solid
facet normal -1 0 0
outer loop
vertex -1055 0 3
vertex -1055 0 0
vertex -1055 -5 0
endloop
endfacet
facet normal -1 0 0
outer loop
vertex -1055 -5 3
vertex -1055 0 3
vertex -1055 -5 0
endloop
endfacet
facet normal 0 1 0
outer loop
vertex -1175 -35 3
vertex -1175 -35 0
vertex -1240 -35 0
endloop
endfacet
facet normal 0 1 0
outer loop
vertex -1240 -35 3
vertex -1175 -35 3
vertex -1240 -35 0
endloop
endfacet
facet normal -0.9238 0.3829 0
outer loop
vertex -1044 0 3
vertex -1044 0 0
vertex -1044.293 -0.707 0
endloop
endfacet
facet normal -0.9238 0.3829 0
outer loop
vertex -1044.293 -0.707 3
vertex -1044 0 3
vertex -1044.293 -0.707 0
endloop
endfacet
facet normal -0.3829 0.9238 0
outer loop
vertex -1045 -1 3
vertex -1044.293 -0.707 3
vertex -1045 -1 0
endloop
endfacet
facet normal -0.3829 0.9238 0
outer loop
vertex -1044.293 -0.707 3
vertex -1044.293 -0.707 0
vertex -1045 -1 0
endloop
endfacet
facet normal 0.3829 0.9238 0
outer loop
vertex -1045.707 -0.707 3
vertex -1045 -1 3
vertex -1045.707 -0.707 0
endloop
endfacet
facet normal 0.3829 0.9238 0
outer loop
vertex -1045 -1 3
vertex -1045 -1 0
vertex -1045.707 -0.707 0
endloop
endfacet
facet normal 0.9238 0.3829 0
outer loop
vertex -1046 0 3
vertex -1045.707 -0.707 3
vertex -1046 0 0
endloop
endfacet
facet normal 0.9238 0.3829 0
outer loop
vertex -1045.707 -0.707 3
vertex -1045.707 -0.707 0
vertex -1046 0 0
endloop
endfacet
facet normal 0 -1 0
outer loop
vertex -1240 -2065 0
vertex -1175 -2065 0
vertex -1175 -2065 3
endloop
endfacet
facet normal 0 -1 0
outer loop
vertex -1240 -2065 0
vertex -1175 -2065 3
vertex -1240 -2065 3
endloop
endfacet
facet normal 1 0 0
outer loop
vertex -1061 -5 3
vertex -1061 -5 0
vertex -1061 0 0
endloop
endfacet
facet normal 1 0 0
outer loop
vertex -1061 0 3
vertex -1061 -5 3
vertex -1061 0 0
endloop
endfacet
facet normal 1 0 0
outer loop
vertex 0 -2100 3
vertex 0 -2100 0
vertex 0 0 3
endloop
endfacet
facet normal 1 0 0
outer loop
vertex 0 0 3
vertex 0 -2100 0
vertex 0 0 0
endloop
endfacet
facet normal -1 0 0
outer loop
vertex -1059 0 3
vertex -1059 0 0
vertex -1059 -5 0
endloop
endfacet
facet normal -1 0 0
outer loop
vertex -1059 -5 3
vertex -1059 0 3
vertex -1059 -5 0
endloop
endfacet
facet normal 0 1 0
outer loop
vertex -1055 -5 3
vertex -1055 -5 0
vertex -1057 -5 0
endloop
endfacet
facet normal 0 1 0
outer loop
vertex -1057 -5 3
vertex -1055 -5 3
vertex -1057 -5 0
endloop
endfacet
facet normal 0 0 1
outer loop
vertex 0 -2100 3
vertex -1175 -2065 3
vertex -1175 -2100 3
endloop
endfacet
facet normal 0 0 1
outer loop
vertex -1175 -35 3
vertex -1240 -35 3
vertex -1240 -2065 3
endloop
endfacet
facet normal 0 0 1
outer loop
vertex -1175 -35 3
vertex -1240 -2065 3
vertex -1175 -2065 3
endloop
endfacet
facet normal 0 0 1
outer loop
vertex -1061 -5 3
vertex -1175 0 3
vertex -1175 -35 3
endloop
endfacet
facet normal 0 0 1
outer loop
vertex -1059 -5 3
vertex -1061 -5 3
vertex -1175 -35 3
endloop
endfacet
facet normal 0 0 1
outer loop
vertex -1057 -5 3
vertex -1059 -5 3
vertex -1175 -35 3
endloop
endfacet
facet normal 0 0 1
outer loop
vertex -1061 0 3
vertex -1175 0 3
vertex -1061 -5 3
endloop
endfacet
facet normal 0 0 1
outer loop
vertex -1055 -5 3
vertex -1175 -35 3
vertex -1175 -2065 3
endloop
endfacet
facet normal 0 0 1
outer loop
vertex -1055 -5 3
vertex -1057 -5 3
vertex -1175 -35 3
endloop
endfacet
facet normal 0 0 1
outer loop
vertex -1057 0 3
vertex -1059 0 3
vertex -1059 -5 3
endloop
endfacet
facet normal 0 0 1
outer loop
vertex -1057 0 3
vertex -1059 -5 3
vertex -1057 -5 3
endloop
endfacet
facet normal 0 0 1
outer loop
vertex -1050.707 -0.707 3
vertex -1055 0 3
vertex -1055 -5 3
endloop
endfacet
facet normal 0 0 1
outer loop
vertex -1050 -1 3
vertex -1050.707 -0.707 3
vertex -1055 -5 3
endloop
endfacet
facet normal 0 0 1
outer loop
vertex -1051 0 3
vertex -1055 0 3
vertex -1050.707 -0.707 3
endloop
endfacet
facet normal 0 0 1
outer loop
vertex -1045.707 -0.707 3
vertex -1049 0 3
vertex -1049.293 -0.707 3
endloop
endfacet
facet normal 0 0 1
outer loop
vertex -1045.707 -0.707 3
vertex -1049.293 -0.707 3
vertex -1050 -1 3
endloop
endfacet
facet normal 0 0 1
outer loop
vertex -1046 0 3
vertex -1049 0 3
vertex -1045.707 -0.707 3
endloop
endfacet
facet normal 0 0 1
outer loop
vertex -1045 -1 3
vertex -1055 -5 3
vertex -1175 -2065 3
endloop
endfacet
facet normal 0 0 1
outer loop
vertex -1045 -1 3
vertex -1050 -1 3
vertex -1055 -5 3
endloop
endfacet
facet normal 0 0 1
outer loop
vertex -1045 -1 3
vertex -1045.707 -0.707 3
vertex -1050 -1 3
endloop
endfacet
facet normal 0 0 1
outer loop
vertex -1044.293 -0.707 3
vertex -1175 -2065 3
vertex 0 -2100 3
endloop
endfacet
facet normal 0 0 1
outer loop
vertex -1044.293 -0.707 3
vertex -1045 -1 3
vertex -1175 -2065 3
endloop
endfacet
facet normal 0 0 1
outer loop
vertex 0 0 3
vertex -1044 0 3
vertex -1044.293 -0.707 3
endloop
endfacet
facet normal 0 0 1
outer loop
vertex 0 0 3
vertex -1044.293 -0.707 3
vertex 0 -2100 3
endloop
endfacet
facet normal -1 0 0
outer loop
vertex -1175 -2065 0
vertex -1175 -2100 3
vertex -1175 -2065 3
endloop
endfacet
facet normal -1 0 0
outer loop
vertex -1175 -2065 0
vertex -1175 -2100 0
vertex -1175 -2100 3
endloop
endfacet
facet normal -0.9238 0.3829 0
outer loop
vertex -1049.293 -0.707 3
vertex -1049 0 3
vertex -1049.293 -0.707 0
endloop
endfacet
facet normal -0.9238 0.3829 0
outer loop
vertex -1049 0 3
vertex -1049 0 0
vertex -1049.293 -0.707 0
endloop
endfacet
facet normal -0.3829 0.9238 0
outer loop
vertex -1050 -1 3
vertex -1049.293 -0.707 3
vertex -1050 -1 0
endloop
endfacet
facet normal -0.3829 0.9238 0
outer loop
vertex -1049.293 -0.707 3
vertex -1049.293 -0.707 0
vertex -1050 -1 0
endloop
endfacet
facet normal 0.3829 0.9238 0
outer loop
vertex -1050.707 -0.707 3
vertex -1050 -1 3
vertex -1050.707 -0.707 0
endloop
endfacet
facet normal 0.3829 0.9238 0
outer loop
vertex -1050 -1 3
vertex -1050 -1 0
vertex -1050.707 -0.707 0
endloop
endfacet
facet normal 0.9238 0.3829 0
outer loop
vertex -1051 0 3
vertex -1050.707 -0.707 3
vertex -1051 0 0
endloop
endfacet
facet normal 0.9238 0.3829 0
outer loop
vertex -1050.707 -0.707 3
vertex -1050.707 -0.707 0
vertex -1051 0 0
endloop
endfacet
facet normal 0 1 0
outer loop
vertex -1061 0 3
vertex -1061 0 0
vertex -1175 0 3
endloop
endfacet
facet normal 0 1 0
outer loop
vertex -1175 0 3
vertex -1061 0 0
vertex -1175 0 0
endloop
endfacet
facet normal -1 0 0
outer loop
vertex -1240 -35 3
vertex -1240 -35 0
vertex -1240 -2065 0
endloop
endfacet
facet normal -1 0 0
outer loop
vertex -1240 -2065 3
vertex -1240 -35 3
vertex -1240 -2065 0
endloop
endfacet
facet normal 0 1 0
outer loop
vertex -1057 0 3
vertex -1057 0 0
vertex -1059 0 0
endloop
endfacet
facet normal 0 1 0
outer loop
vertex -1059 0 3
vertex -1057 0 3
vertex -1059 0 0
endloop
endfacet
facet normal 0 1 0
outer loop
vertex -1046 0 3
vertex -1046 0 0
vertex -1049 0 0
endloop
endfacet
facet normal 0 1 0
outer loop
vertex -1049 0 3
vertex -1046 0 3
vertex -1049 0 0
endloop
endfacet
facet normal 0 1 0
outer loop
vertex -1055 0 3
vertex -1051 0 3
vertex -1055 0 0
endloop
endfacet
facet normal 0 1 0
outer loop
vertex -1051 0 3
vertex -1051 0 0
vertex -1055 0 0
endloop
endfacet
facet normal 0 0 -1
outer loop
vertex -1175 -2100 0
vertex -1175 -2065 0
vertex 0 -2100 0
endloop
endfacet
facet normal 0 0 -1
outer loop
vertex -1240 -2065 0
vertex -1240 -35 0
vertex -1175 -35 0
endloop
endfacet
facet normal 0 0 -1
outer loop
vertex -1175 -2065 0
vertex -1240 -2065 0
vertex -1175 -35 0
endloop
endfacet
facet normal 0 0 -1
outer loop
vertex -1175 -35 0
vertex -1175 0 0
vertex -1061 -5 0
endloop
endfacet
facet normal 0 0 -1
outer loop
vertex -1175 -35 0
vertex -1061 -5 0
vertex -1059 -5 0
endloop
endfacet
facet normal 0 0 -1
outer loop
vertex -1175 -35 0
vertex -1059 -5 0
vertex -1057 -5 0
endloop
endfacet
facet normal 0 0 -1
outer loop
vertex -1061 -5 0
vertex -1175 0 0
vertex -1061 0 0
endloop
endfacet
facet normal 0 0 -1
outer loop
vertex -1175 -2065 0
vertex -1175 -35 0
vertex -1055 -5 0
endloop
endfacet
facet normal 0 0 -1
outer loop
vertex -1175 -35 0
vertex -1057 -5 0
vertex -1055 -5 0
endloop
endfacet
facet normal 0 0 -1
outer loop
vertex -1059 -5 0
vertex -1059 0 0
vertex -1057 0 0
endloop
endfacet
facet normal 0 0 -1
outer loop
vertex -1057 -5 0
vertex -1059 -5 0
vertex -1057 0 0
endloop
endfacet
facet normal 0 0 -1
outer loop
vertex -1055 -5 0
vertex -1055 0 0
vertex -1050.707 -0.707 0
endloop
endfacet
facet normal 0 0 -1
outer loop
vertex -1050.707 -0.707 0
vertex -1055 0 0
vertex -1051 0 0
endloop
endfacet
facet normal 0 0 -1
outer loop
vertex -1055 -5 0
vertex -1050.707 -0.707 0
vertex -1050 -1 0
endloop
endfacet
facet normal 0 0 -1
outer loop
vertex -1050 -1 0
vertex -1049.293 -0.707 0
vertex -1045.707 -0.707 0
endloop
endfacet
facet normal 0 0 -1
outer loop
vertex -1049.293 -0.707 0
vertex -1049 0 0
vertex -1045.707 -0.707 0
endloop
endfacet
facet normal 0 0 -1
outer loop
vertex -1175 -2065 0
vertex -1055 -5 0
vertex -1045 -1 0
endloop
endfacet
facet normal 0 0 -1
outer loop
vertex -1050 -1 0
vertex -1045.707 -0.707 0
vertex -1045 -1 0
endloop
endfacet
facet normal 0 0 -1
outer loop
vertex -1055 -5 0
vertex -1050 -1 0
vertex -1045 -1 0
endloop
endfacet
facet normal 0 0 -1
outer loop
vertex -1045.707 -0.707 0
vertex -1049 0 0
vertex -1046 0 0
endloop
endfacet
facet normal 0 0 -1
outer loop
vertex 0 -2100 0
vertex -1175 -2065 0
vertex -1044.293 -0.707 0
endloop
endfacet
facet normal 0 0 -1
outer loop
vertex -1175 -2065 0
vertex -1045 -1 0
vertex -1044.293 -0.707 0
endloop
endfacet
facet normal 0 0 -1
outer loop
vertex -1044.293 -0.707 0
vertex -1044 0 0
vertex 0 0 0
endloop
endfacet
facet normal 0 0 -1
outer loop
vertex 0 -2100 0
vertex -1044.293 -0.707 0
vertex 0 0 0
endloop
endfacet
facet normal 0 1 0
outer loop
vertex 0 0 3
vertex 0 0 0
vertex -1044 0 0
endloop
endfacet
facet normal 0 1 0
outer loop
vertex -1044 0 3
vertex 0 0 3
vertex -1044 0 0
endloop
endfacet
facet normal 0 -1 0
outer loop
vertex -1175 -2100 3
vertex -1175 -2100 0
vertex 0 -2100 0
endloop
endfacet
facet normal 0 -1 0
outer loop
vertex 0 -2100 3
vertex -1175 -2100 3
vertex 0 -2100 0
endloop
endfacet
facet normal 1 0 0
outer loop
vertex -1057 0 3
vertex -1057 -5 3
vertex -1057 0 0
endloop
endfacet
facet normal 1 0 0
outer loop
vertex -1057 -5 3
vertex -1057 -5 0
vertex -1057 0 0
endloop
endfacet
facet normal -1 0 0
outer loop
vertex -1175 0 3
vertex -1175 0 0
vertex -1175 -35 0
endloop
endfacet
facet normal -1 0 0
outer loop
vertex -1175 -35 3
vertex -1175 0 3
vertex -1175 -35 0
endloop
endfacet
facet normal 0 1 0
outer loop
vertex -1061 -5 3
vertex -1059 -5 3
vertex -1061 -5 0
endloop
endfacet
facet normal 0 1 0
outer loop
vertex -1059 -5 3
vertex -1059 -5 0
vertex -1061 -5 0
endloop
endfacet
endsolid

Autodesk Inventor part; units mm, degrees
ref_plane "YZ Plane" through (0, 0, 0) normal (1, 0, 0) x (0, 1, 0)
ref_plane "XZ Plane" through (0, 0, 0) normal (0, 1, 0) x (-1, 0, 0)
ref_plane "XY Plane" through (0, 0, 0) normal (0, 0, 1) x (1, 0, 0)
sketch "Sketch1" plane through (0, 0, 0) normal (0, 0, 1) x (1, 0, 0)
  line L0 (0, 0) -> (-1240, 0)
  line L1 (-1240, 0) -> (-1240, -2100)
  line L2 (-1240, -2100) -> (0, -2100)
  line L3 (0, -2100) -> (0, 0)
  line L4 (0, 0) -> (-65, 0)
  line L5 (-65, 0) -> (-65, -35)
  line L6 (-65, -35) -> (0, -35)
  line L7 (0, -35) -> (0, 0)
  line L8 (0, -2100) -> (-65, -2100)
  line L9 (-65, -2100) -> (-65, -2065)
  line L10 (-65, -2065) -> (0, -2065)
  line L11 (0, -2065) -> (0, -2100)
  line L12 (-1240, 0) -> (-1175, 0)
  line L13 (-1175, 0) -> (-1175, -35)
  line L14 (-1175, -35) -> (-1240, -35)
  line L15 (-1240, -35) -> (-1240, 0)
  line L16 (-1240, -2100) -> (-1175, -2100)
  line L17 (-1175, -2100) -> (-1175, -2065)
  line L18 (-1175, -2065) -> (-1240, -2065)
  line L19 (-1240, -2065) -> (-1240, -2100)
  line L20 (-1125, -2100) -> (-1035, -2100)
  line L21 (-1035, -2100) -> (-1035, -2065)
  line L22 (-1035, -2065) -> (-1125, -2065)
  line L23 (-1125, -2065) -> (-1125, -2100)
  line L24 (-1125, 0) -> (-1035, 0)
  line L25 (-1035, 0) -> (-1035, -35)
  line L26 (-1035, -35) -> (-1125, -35)
  line L27 (-1125, -35) -> (-1125, 0)
  point P0 (0, -35)
  point P1 (-65, 0)
  point P2 (-65, -2100)
  point P3 (0, -2065)
  point P4 (-1035, -2100)
  point P5 (-1035, 0)
  point P6 (-1175, 0)
  point P7 (-1175, -2100)
  dimension "d22" = 1240
  dimension "d23" = 2100
  dimension "d24" = 65
  dimension "d25" = 35
  dimension "d28" = 90
  dimension "d29" = 970
extrude "Plate1" add sketch "Sketch1" along normal blind 3 contours L3 L6 L5 L0 | L5 L6 L3 L10 L9 L2 L21 L22 L23 L17 L18 L1 L14 L13 L0 L27 L26 L25 | L25 L26 L27 L0 | L3 L2 L9 L10 | L2 L23 L22 L21
sketch "Sketch5" plane through (0, 0, 0) normal (0, 0, -1) x (-1, 0, 0)
  line L0 (1175, 0) -> (1075, 0) construction
  line L1 (1075, 0) -> (1075, -2) construction
  line L2 (1075, -2) -> (1175, -2) construction
  line L3 (1175, -2) -> (1175, 0) construction
  line L4 (1075, 0) -> (1073.4752, -4.6556)
  arc A0 (1072.5248, -4.6556) -> (1073.4752, -4.6556) centre (1073, -4.5) ccw
  line L5 (1072.5248, -4.6556) -> (1071, 0)
  line L6 (1071, 0) -> (1075, 0)
  line L7 (1071, 0) -> (1069, 0) construction
  line L8 (1069, 0) -> (1067, 0)
  line L9 (1067, 0) -> (1067, -5)
  line L10 (1067, -5) -> (1069, -5)
  line L11 (1069, -5) -> (1069, 0)
  line L12 (1067, 0) -> (1065, 0) construction
  line L13 (1065, 0) -> (1063, 0)
  line L14 (1063, 0) -> (1063, -5)
  line L15 (1063, -5) -> (1065, -5)
  line L16 (1065, -5) -> (1065, 0)
  line L17 (1063, 0) -> (1061, 0) construction
  line L18 (1061, 0) -> (1059, 0)
  line L19 (1059, 0) -> (1059, -5)
  line L20 (1059, -5) -> (1061, -5)
  line L21 (1061, -5) -> (1061, 0)
  line L22 (1059, 0) -> (1057, 0) construction
  line L23 (1057, 0) -> (1055, 0)
  line L24 (1055, 0) -> (1055, -5)
  line L25 (1055, -5) -> (1057, -5)
  line L26 (1057, -5) -> (1057, 0)
  line L27 (1055, 0) -> (1050, 0) construction
  line L28 (1050, 0) -> (1045, 0) construction
  circle A1 centre (1050, 0) radius 1
  circle A2 centre (1045, 0) radius 1
  line L29 (0, 0) -> (1175, 0) projected
  point P0 (1175, 0)
  point P1 (1073, 0)
  dimension "d30" = 100
  dimension "d31" = 2
  dimension "d32" = 5
  dimension "d33" = 4
  dimension "d34" = 0.5
  dimension "d35" = 5
  dimension "d36" = 5
  dimension "d37" = 5
  dimension "d38" = 2
extrude "Cut1" cut sketch "Sketch5" against normal blind 3 contours A2 L29 | L29 A2 | A1 L29 | L29 A1 | L26 L25 L24 L23 | L21 L20 L19 L18
equation "\"d33\" = 2 * d31"
equation "\"d34\" = 0.25 * d31"
equation "\"d38\" = d31"
equation "\"d39\" = Thickness"
equation "\"d2\" = Thickness"
equation "\"BendReliefWidth\" = Thickness"
equation "\"BendReliefDepth\" = 0.5 * Thickness"
equation "\"CornerReliefSize\" = 4 * Thickness"
equation "\"MinimumRemnant\" = 2 * Thickness"
equation "\"TransitionRadius\" = BendRadius"
equation "\"JacobiRadiusSize\" = BendRadius"
equation "\"GapSize\" = Thickness"
equation "\"Thickness\" = 3"
equation "\"BendRadius\" = 5"
properties part number "GnG frame 2 floor sheet 6" material "Stainless Steel"
